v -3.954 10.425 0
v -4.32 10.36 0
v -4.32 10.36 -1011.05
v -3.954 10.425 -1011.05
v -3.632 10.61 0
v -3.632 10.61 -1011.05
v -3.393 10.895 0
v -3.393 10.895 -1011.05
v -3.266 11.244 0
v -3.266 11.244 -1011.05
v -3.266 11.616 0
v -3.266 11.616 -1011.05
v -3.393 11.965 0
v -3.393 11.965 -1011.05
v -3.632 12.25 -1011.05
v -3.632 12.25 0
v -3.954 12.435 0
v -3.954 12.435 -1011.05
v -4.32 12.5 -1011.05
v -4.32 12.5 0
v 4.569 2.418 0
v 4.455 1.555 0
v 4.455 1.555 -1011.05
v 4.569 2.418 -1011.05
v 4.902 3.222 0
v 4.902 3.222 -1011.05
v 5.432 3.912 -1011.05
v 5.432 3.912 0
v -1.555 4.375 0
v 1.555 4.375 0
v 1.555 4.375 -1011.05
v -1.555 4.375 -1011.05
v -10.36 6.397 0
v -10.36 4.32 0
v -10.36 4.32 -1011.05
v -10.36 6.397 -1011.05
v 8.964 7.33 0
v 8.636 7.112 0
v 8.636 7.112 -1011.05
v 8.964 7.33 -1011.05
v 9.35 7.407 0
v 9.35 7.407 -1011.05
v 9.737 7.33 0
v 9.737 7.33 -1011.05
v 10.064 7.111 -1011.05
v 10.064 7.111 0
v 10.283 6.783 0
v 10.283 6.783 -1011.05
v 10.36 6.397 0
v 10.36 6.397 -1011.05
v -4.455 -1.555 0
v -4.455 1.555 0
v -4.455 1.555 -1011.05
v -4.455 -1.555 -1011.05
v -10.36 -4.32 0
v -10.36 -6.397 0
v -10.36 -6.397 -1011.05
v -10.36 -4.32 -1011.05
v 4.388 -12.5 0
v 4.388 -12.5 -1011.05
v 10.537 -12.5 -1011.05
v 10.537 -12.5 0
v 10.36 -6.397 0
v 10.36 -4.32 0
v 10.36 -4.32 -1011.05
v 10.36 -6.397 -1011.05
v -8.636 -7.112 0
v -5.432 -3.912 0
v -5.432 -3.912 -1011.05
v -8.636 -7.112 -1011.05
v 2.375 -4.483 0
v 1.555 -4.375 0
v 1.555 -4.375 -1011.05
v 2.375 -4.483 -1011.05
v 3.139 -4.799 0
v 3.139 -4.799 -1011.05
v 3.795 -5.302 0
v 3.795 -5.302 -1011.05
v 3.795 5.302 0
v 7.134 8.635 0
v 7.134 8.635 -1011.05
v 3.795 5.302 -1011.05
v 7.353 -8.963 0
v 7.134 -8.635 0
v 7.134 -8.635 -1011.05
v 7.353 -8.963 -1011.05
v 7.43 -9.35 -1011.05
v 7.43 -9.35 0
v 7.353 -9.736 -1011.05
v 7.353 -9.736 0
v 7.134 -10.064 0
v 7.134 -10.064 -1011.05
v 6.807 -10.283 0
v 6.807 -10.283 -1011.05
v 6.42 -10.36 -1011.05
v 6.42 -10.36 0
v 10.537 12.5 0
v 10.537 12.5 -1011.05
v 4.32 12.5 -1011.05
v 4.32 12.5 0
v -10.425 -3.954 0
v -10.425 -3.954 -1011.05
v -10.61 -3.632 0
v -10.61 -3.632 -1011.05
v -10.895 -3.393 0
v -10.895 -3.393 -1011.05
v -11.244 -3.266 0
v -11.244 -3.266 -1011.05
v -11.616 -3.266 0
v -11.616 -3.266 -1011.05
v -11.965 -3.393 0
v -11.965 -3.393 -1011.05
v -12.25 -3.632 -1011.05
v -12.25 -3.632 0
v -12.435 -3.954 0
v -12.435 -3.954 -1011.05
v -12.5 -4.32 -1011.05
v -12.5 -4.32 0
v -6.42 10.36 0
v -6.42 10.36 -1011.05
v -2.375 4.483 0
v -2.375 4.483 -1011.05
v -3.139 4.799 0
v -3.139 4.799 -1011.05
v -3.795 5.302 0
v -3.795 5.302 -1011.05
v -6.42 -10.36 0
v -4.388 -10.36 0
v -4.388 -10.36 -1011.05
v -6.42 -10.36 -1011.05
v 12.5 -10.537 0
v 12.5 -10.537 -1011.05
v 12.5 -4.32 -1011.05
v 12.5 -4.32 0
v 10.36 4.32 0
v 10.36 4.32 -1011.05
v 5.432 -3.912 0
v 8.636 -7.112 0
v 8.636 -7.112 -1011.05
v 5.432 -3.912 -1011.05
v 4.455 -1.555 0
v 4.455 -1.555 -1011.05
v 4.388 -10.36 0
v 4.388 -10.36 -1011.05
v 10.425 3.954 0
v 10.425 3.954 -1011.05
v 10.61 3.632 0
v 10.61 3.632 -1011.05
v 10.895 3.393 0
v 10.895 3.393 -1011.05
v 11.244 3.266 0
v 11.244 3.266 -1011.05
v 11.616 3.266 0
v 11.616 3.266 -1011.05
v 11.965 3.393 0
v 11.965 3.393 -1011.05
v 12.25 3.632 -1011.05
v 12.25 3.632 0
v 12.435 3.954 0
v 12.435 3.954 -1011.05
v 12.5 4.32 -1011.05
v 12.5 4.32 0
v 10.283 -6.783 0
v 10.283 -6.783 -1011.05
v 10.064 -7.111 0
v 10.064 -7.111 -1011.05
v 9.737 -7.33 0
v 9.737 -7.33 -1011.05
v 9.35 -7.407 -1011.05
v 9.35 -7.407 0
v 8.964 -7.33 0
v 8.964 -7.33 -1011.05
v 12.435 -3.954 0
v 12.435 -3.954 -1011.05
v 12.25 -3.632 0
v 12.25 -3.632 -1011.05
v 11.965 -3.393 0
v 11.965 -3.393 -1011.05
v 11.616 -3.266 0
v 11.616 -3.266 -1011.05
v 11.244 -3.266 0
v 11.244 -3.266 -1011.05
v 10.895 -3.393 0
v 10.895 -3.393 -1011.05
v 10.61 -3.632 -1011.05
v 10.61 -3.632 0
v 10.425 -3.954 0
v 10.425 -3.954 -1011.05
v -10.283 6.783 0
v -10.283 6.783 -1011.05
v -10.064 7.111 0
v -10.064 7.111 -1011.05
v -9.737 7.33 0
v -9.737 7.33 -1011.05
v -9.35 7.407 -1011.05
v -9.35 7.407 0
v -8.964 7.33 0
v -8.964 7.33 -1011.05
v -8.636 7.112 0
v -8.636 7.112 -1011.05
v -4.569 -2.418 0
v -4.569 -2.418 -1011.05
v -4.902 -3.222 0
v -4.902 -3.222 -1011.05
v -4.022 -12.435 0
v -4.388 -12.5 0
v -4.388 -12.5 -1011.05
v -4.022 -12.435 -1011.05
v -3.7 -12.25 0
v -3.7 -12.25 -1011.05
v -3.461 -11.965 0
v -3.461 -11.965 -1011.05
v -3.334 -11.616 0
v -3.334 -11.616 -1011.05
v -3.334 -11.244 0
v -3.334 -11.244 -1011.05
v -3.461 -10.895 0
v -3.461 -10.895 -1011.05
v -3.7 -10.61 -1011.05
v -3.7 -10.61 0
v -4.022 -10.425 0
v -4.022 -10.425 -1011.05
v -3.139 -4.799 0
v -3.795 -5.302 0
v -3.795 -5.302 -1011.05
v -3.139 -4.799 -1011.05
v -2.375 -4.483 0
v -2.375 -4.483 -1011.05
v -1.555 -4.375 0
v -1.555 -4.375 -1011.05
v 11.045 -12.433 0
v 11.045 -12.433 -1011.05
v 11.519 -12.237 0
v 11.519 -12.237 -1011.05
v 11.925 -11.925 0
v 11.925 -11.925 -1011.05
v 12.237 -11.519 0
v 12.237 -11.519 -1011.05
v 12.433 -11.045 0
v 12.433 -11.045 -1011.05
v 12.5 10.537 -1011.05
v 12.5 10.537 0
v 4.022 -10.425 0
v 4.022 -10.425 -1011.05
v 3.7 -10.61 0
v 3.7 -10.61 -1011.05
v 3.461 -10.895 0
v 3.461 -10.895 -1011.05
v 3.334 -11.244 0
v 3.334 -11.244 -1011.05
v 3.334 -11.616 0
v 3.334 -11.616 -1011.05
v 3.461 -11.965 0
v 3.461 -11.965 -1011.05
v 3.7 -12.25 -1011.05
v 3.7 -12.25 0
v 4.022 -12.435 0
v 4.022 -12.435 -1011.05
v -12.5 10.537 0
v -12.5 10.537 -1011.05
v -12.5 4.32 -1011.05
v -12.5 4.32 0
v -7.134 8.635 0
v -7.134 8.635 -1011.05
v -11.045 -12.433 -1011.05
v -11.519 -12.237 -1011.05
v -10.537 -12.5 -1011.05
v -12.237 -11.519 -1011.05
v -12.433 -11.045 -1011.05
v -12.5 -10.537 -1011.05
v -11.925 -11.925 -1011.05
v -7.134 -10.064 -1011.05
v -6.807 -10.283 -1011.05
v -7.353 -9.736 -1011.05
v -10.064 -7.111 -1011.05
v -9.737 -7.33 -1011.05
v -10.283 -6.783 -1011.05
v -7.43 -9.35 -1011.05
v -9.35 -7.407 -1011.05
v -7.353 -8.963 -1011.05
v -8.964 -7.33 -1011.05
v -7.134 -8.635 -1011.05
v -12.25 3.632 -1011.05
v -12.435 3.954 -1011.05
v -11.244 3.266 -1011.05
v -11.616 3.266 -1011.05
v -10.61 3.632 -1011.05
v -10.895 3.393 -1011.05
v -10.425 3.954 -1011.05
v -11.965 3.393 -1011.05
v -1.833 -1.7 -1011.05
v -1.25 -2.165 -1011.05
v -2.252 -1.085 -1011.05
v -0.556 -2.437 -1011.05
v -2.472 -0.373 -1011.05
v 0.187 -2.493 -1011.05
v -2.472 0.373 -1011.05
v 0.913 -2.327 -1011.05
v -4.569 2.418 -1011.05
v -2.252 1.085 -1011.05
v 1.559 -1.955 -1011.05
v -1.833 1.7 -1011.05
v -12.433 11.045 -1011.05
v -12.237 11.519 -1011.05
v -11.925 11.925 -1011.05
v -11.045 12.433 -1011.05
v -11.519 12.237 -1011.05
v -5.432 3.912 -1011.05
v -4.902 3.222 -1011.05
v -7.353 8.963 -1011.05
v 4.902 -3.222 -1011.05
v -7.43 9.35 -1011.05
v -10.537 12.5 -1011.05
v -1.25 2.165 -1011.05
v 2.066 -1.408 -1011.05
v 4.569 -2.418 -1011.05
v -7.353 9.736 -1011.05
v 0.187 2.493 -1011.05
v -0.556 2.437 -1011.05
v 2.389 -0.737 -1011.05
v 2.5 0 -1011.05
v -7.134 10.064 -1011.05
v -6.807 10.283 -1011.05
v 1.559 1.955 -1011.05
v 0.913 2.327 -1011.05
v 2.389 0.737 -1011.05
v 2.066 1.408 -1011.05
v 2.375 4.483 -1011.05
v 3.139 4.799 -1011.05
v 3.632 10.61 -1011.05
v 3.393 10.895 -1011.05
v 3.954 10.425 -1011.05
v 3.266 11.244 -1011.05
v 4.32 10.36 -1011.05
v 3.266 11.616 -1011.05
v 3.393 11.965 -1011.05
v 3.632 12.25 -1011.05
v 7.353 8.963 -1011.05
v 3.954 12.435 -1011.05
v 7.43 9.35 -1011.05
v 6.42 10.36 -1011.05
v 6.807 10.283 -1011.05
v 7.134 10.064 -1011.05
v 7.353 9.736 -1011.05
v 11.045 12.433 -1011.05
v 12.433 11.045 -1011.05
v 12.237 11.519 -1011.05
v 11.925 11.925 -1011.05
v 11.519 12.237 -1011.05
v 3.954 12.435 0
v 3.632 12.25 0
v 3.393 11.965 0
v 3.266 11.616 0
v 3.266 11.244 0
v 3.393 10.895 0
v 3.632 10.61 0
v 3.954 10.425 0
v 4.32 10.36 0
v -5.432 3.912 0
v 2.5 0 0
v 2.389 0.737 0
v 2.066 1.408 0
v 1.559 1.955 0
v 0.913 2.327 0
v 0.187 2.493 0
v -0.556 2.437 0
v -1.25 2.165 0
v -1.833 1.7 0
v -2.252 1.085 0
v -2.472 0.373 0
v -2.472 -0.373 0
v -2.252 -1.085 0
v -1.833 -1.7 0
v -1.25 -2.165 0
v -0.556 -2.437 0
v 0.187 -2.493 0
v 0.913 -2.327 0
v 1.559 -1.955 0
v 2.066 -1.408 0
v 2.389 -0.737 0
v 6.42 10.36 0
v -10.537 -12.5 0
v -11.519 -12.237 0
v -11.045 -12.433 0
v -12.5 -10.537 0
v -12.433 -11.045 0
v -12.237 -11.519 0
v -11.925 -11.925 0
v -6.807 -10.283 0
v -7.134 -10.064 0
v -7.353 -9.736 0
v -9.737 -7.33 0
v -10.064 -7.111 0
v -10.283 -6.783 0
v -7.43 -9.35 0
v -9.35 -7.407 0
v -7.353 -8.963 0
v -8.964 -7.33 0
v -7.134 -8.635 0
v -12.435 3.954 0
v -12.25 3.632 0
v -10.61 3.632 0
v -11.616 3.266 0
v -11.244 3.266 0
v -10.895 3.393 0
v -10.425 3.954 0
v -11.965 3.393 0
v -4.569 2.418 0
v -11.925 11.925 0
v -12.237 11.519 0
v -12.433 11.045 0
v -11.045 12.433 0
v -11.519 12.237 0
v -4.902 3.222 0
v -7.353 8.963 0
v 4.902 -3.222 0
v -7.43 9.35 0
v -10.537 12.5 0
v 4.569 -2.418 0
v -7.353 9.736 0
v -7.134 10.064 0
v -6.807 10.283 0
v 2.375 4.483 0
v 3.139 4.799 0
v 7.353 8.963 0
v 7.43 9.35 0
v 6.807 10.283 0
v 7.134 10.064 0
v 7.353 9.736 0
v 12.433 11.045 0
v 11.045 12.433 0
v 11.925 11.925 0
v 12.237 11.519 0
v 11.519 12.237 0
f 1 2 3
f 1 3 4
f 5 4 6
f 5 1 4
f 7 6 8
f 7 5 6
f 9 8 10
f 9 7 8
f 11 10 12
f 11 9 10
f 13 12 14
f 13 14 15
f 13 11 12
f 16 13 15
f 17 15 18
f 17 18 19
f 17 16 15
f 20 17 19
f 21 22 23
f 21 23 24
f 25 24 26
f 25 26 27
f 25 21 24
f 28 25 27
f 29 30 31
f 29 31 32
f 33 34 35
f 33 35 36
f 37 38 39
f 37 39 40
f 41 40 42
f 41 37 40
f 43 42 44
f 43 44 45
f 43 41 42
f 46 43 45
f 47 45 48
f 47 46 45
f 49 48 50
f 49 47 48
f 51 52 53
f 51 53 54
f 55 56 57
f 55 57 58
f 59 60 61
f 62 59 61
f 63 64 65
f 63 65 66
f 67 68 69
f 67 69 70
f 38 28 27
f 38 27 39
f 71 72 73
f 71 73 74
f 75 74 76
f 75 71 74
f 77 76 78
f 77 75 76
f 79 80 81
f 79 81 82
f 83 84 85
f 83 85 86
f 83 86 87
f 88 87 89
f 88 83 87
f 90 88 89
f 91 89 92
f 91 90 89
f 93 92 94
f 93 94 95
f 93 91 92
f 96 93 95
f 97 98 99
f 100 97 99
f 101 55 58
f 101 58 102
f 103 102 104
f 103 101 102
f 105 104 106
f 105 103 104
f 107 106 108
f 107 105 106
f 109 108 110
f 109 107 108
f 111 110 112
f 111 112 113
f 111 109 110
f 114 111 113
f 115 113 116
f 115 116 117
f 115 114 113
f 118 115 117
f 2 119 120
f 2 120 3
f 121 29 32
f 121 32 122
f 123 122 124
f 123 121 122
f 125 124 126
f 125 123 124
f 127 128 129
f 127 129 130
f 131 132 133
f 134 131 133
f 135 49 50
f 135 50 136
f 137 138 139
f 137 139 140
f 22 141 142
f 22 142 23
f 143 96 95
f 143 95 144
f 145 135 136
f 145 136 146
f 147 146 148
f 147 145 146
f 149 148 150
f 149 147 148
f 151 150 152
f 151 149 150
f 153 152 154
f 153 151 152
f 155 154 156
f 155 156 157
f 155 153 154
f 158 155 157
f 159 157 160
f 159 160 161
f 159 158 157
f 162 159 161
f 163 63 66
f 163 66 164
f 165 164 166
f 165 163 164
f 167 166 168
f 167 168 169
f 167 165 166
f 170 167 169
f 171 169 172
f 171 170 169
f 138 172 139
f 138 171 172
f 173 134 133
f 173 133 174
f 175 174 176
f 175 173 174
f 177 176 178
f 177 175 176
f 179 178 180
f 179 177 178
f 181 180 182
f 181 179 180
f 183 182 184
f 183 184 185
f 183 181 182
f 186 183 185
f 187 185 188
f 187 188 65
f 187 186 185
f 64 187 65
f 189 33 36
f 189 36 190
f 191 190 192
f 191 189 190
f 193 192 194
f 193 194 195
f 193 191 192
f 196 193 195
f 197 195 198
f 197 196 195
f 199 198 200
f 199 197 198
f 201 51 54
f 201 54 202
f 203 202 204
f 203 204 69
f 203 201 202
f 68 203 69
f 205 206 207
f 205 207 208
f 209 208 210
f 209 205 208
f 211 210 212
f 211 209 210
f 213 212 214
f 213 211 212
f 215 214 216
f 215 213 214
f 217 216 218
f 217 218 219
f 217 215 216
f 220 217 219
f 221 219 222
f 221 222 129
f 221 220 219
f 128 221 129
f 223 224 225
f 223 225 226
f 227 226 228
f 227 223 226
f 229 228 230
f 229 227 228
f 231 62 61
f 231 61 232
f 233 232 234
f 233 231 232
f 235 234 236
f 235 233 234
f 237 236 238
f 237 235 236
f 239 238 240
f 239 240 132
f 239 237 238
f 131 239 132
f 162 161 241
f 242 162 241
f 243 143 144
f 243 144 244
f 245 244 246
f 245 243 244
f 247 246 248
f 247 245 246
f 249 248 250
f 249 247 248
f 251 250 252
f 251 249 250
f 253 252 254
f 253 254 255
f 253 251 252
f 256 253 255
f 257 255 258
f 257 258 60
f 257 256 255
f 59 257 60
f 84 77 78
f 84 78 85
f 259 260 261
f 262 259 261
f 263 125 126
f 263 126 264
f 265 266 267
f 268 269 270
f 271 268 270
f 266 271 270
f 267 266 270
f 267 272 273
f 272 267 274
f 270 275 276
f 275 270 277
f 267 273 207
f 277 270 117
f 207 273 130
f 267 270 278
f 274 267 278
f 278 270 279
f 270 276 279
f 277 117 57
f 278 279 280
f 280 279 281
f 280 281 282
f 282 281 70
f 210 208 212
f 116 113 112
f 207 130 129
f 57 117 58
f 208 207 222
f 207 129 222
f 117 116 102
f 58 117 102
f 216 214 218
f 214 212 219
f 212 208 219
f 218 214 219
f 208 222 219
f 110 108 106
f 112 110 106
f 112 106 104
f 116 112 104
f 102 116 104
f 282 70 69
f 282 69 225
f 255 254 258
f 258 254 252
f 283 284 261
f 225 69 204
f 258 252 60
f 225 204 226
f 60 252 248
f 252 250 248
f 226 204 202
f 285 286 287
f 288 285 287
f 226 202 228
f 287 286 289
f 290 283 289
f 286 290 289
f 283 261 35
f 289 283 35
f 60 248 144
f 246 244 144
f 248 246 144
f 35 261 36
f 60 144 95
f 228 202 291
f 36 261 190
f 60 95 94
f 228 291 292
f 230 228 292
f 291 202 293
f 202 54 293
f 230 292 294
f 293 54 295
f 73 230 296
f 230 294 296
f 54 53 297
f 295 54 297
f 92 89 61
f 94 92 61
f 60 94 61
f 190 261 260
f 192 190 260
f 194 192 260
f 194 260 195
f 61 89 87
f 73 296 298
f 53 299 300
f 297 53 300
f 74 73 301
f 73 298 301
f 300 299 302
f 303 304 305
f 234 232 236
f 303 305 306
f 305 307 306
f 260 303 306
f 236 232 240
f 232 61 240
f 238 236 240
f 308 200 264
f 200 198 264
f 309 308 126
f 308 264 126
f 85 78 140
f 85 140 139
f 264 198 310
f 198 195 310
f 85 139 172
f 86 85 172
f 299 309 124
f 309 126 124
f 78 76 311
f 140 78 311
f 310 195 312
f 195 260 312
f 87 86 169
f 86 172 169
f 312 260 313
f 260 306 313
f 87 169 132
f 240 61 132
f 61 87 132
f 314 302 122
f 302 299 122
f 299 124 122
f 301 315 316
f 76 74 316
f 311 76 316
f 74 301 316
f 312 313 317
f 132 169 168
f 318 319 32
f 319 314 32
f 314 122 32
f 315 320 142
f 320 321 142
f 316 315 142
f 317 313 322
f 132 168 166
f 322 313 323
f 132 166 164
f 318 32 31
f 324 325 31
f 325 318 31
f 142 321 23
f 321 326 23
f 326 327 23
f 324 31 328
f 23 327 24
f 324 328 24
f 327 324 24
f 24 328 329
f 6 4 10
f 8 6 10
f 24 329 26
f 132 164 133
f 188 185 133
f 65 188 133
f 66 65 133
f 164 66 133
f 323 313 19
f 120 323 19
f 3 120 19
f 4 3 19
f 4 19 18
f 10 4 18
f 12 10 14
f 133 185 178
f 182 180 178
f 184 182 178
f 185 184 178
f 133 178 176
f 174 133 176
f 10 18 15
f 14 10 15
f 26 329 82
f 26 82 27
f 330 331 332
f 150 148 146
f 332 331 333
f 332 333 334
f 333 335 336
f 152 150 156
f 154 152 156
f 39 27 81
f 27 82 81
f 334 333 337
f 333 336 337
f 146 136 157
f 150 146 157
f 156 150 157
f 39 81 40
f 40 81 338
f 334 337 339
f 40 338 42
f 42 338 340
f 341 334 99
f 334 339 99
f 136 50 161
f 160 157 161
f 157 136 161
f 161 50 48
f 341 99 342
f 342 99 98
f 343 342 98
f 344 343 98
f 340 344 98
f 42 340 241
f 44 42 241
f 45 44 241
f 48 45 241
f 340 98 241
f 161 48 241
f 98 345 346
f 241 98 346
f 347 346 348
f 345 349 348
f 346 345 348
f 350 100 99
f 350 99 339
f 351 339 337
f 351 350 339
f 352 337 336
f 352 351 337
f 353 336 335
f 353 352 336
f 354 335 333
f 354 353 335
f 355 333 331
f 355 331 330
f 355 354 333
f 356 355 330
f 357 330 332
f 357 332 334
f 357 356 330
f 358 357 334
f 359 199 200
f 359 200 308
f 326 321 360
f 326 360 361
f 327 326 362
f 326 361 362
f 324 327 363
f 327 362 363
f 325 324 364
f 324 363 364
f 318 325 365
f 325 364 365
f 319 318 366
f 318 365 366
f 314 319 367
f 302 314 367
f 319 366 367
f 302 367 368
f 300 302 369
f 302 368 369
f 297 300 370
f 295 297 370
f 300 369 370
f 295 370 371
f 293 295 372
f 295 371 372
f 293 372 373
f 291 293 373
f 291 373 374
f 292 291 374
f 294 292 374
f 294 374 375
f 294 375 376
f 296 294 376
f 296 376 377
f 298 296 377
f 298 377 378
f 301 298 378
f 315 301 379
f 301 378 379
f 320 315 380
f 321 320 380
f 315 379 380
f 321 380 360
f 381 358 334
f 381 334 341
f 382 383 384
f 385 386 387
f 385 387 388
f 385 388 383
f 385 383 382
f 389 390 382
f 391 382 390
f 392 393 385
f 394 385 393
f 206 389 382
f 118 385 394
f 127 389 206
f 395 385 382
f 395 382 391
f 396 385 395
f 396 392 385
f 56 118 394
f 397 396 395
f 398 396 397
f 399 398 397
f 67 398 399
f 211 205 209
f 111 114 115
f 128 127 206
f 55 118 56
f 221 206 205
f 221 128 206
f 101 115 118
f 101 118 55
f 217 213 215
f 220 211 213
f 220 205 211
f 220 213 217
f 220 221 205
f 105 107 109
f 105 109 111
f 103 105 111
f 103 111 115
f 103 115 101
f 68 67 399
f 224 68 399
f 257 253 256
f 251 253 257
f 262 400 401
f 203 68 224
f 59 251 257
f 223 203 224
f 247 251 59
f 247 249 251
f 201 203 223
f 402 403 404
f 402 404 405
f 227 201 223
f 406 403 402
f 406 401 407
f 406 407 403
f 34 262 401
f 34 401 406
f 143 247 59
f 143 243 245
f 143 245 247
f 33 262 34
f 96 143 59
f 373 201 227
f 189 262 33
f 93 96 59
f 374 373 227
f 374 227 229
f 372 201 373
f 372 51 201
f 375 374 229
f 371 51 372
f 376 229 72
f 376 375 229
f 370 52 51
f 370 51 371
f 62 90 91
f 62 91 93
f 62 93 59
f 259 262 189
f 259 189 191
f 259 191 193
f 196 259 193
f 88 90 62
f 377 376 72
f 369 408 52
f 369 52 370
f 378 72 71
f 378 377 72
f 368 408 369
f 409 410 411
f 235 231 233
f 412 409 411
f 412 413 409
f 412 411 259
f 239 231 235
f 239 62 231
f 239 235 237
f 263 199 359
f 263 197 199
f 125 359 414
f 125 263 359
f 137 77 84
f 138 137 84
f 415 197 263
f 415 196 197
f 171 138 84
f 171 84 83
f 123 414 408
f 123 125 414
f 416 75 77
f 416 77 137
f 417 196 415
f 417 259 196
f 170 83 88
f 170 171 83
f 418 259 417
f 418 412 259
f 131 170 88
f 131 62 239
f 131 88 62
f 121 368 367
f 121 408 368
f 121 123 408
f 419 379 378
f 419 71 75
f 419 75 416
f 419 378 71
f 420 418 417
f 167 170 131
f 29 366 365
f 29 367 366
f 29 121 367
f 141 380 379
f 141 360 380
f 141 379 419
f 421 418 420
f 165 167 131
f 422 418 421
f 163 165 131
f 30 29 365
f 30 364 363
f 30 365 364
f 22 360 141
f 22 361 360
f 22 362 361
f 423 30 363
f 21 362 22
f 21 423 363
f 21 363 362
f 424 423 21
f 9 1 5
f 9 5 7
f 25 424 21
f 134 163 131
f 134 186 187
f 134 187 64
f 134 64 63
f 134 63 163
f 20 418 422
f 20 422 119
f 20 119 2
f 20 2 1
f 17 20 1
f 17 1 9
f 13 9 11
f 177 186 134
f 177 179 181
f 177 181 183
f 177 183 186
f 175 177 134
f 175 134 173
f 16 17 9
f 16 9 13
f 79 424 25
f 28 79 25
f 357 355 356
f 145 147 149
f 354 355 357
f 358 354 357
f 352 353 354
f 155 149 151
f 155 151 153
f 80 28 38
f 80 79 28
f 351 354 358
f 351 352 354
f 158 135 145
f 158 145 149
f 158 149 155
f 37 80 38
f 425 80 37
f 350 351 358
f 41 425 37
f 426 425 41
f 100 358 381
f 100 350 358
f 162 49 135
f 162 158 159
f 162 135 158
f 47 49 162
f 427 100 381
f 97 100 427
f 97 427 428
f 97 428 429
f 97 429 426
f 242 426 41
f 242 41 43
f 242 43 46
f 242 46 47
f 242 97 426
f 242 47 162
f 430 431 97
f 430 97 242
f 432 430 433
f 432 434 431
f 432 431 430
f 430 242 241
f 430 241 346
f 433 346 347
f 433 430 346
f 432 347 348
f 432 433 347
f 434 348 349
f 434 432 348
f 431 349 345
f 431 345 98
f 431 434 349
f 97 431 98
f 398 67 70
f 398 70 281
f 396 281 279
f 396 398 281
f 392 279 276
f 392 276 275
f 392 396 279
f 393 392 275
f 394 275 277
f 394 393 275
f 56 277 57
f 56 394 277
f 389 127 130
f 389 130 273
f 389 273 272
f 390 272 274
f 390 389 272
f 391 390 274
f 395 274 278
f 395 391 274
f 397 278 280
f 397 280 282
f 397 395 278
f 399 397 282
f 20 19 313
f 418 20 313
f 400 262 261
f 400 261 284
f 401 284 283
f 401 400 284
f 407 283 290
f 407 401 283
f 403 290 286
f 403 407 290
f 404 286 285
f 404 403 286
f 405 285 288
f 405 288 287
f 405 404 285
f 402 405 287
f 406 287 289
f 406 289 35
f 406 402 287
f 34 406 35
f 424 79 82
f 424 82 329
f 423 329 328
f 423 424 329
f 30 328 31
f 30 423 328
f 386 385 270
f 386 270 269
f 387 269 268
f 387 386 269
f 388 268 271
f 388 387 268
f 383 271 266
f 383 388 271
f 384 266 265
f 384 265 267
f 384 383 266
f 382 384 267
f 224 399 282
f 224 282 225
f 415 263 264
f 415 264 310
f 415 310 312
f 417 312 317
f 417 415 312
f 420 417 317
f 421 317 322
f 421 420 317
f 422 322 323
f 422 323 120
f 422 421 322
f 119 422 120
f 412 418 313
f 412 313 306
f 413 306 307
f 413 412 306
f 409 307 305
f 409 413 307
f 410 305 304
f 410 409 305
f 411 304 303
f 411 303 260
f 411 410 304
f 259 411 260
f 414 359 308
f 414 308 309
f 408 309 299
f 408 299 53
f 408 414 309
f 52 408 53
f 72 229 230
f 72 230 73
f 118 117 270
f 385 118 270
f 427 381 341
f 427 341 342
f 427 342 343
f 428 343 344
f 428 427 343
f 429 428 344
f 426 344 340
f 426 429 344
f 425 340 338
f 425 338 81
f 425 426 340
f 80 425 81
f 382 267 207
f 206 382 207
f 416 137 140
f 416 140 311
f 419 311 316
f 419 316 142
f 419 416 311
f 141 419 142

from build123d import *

# Parameters (mm, degrees)
SKETCH1_R      = 2.5
EXTRUDE1_DEPTH = 1011.05


with BuildPart() as part:
    # Sketch1 → Extrude1 (new body)
    with BuildSketch(Plane.XY):
        with BuildLine():
            Line((-8.636346088, 7.111588351), (-5.432204773, 3.912143135))
            ThreePointArc((-5.432204773, 3.912143135), (-4.708985779, 2.831057106), (-4.455, 1.555406707))
            Line((-4.455, 1.555406707), (-4.455, -1.555406707))
            ThreePointArc((-4.455, -1.555406707), (-4.708985779, -2.831057106), (-5.432204773, -3.912143135))
            Line((-5.432204773, -3.912143135), (-8.636346088, -7.111588351))
            ThreePointArc((-8.636346088, -7.111588351), (-9.736852394, -7.329863489), (-10.36, -6.396886949))
            Line((-10.36, -6.396886949), (-10.36, -4.32))
            ThreePointArc((-10.36, -4.32), (-11.43, -3.25), (-12.5, -4.32))
            Line((-12.5, -4.32), (-12.5, -8.651801989))
            Line((-12.5, -8.651801989), (-12.5, -10.537068835))
            ThreePointArc((-12.5, -10.537068835), (-11.925070773, -11.925070773), (-10.537068835, -12.5))
            Line((-10.537068835, -12.5), (-8.441567612, -12.5))
            Line((-8.441567612, -12.5), (-4.387856959, -12.5))
            ThreePointArc((-4.387856959, -12.5), (-3.317856959, -11.43), (-4.387856959, -10.36))
            Line((-4.387856959, -10.36), (-6.42, -10.36))
            ThreePointArc((-6.42, -10.36), (-7.35325999, -9.736168088), (-7.133653912, -8.635298598))
            Line((-7.133653912, -8.635298598), (-3.795290766, -5.301828272))
            ThreePointArc((-3.795290766, -5.301828272), (-2.76743922, -4.61585726), (-1.555406707, -4.375))
            Line((-1.555406707, -4.375), (1.555406707, -4.375))
            ThreePointArc((1.555406707, -4.375), (2.76743922, -4.61585726), (3.795290766, -5.301828272))
            Line((3.795290766, -5.301828272), (7.133653912, -8.635298598))
            ThreePointArc((7.133653912, -8.635298598), (7.35325999, -9.736168088), (6.42, -10.36))
            Line((6.42, -10.36), (4.387856959, -10.36))
            ThreePointArc((4.387856959, -10.36), (3.317856959, -11.43), (4.387856959, -12.5))
            Line((4.387856959, -12.5), (8.441567612, -12.5))
            Line((8.441567612, -12.5), (10.537068835, -12.5))
            ThreePointArc((10.537068835, -12.5), (11.925070773, -11.925070773), (12.5, -10.537068835))
            Line((12.5, -10.537068835), (12.5, -8.651801989))
            Line((12.5, -8.651801989), (12.5, -4.32))
            ThreePointArc((12.5, -4.32), (11.43, -3.25), (10.36, -4.32))
            Line((10.36, -4.32), (10.36, -6.396886949))
            ThreePointArc((10.36, -6.396886949), (9.736852394, -7.329863489), (8.636346088, -7.111588351))
            Line((8.636346088, -7.111588351), (5.432204773, -3.912143135))
            ThreePointArc((5.432204773, -3.912143135), (4.708985779, -2.831057106), (4.455, -1.555406707))
            Line((4.455, -1.555406707), (4.455, 1.555406707))
            ThreePointArc((4.455, 1.555406707), (4.708985779, 2.831057106), (5.432204773, 3.912143135))
            Line((5.432204773, 3.912143135), (8.636346088, 7.111588351))
            ThreePointArc((8.636346088, 7.111588351), (9.736852394, 7.329863489), (10.36, 6.396886949))
            Line((10.36, 6.396886949), (10.36, 4.32))
            ThreePointArc((10.36, 4.32), (11.43, 3.25), (12.5, 4.32))
            Line((12.5, 4.32), (12.5, 7.99129648))
            Line((12.5, 7.99129648), (12.5, 10.537068835))
            ThreePointArc((12.5, 10.537068835), (11.925070773, 11.925070773), (10.537068835, 12.5))
            Line((10.537068835, 12.5), (4.32, 12.5))
            ThreePointArc((4.32, 12.5), (3.25, 11.43), (4.32, 10.36))
            Line((4.32, 10.36), (6.42, 10.36))
            ThreePointArc((6.42, 10.36), (7.35325999, 9.736168088), (7.133653912, 8.635298598))
            Line((7.133653912, 8.635298598), (3.795290766, 5.301828272))
            ThreePointArc((3.795290766, 5.301828272), (2.76743922, 4.61585726), (1.555406707, 4.375))
            Line((1.555406707, 4.375), (-1.555406707, 4.375))
            ThreePointArc((-1.555406707, 4.375), (-2.76743922, 4.61585726), (-3.795290766, 5.301828272))
            Line((-3.795290766, 5.301828272), (-7.133653912, 8.635298598))
            ThreePointArc((-7.133653912, 8.635298598), (-7.35325999, 9.736168088), (-6.42, 10.36))
            Line((-6.42, 10.36), (-4.32, 10.36))
            ThreePointArc((-4.32, 10.36), (-3.25, 11.43), (-4.32, 12.5))
            Line((-4.32, 12.5), (-10.537068835, 12.5))
            ThreePointArc((-10.537068835, 12.5), (-11.925070773, 11.925070773), (-12.5, 10.537068835))
            Line((-12.5, 10.537068835), (-12.5, 7.99129648))
            Line((-12.5, 7.99129648), (-12.5, 4.32))
            ThreePointArc((-12.5, 4.32), (-11.43, 3.25), (-10.36, 4.32))
            Line((-10.36, 4.32), (-10.36, 6.396886949))
            ThreePointArc((-10.36, 6.396886949), (-9.736852394, 7.329863489), (-8.636346088, 7.111588351))
        make_face()
        Circle(SKETCH1_R, mode=Mode.SUBTRACT)
    extrude(amount=-EXTRUDE1_DEPTH)


solid = part.part
